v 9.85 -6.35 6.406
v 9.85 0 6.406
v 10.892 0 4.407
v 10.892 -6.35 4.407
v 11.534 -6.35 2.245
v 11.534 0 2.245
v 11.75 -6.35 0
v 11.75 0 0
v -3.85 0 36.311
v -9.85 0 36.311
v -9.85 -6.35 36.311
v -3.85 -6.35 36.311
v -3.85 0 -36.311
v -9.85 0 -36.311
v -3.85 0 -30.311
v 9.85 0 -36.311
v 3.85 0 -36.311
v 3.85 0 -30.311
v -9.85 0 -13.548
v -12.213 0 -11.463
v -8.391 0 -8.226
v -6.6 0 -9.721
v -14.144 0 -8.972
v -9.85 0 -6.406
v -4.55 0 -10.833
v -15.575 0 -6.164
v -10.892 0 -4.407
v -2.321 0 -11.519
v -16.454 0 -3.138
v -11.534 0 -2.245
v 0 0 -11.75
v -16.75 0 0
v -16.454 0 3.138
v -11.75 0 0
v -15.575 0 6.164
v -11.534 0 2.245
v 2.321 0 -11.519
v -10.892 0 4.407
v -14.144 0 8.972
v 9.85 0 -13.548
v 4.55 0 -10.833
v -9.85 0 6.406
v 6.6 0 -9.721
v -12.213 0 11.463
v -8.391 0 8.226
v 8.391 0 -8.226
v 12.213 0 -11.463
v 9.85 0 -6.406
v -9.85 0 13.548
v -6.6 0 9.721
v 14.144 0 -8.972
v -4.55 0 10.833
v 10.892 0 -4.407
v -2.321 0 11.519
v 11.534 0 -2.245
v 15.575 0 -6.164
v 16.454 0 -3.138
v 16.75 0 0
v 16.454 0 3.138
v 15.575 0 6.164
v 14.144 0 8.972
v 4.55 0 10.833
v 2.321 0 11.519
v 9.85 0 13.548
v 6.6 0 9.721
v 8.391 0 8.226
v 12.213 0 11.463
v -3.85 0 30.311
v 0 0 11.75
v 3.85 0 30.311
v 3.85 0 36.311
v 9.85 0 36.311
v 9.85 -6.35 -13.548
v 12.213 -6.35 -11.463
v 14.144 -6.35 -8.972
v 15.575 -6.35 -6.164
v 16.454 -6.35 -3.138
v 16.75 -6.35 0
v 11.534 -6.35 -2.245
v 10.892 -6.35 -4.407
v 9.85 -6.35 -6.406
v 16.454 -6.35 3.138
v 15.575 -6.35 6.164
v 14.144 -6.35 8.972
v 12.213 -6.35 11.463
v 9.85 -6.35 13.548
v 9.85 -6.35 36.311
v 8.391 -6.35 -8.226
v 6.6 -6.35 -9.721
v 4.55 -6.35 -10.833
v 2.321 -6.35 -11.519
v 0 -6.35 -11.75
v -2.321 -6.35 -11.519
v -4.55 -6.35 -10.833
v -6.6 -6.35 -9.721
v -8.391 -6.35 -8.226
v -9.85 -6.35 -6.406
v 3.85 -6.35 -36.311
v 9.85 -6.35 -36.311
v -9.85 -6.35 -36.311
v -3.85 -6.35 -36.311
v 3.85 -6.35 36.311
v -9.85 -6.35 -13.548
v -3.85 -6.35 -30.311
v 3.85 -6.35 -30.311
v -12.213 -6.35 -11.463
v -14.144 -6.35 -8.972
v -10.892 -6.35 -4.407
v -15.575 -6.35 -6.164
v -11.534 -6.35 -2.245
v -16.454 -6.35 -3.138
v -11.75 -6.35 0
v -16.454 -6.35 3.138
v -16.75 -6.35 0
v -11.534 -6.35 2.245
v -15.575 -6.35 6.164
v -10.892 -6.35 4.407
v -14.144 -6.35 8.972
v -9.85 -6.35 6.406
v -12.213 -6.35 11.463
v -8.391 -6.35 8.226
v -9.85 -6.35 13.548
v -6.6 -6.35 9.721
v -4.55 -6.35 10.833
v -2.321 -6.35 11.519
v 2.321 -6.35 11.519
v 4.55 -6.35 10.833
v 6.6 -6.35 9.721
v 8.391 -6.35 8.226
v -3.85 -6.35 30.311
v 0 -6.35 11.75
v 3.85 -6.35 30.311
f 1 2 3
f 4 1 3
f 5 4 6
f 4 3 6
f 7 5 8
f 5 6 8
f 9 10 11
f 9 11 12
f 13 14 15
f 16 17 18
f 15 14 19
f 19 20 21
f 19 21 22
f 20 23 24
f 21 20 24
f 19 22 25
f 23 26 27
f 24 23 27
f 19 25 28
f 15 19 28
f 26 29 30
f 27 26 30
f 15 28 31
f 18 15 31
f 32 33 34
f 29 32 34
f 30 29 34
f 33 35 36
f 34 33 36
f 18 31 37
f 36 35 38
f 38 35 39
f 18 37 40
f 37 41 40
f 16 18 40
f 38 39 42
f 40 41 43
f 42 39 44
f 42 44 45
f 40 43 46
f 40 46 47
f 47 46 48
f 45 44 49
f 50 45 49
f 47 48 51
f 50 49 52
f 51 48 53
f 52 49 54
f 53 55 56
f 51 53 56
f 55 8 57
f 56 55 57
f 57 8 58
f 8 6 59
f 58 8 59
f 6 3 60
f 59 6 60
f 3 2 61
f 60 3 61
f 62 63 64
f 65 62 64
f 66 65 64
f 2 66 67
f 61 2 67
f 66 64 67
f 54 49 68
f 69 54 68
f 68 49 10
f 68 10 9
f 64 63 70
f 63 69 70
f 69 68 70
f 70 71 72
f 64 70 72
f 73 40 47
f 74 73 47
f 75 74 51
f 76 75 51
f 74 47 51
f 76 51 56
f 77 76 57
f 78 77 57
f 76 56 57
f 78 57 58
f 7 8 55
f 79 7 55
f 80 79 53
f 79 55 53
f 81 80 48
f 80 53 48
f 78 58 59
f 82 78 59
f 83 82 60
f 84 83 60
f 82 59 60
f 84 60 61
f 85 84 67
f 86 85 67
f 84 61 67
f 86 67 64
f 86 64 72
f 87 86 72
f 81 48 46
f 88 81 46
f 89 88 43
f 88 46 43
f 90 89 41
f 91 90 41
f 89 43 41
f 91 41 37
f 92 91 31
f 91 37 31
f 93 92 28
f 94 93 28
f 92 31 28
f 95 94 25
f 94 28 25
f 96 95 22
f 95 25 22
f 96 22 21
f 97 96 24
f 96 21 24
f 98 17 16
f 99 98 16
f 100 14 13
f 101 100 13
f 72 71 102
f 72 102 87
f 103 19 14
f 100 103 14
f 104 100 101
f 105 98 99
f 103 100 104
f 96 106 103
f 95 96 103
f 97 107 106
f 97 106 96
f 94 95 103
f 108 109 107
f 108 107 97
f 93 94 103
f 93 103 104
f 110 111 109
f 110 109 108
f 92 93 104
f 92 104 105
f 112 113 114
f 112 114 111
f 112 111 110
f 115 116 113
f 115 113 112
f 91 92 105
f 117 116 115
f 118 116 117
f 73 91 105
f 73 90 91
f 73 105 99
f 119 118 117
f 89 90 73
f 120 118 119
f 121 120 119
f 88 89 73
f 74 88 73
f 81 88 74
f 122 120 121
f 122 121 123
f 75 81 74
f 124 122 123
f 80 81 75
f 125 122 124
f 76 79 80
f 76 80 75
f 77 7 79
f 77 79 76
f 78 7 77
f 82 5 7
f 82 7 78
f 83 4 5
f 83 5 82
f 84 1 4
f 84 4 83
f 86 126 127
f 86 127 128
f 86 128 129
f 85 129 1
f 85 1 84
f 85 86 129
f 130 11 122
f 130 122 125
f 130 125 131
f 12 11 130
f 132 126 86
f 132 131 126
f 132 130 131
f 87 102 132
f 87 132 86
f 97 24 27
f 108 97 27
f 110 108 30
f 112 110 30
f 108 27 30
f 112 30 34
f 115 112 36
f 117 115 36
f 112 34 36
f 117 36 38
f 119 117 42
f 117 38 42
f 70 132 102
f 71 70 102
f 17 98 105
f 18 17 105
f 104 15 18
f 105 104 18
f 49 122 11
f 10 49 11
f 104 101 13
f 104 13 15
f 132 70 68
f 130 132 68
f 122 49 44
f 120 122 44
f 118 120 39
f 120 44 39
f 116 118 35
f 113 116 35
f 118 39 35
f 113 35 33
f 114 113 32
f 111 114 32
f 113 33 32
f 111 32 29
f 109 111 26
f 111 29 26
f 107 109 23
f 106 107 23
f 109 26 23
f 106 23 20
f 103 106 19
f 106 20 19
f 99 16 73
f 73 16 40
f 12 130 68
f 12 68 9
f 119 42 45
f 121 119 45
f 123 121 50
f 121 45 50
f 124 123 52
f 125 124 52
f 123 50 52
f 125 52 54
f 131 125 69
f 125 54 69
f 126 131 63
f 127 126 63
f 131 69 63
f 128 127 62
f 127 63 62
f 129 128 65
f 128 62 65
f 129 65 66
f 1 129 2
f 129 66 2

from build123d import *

# Parameters (mm, degrees)
F1_DEPTH = 6.35
F2_W     = 6
F2_H     = 6
F3_DEPTH = 6.35


# Not quite as in the source:
# - a length typed as a fraction of an inch, garbled in the dataset ("3 / 203.2 mm" for 3/8 in), is restored


with BuildPart() as f1:
    # F0 (on Front) → F1 (new body)
    with BuildSketch(Plane.XZ):
        with BuildLine():
            ThreePointArc((9.85, 6.4062469512), (11.2649900133, 3.3410327745), (11.75, 0))
            ThreePointArc((11.75, 0), (11.2649900133, -3.3410327745), (9.85, -6.4062469512))
            Line((9.85, -6.4062469512), (9.85, -13.5476935306))
            ThreePointArc((9.85, -13.5476935306), (14.9256490646, -7.6018089952), (16.75, 0))
            ThreePointArc((16.75, 0), (14.9256490646, 7.6018089952), (9.85, 13.5476935306))
            Line((9.85, 13.5476935306), (9.85, 6.4062469512))
        make_face()
        with BuildLine():
            ThreePointArc((-9.85, 6.4062469512), (0, 11.75), (9.85, 6.4062469512))
            Line((9.85, 6.4062469512), (9.85, 13.5476935306))
            ThreePointArc((9.85, 13.5476935306), (0, 16.75), (-9.85, 13.5476935306))
            Line((-9.85, 13.5476935306), (-9.85, 6.4062469512))
        make_face()
        with BuildLine():
            Line((9.85, -13.5476935306), (9.85, -6.4062469512))
            ThreePointArc((9.85, -6.4062469512), (0, -11.75), (-9.85, -6.4062469512))
            Line((-9.85, -6.4062469512), (-9.85, -13.5476935306))
            ThreePointArc((-9.85, -13.5476935306), (0, -16.75), (9.85, -13.5476935306))
        make_face()
        with BuildLine():
            ThreePointArc((-9.85, -6.4062469512), (-11.75, 0), (-9.85, 6.4062469512))
            Line((-9.85, 6.4062469512), (-9.85, 13.5476935306))
            ThreePointArc((-9.85, 13.5476935306), (-16.75, 0), (-9.85, -13.5476935306))
            Line((-9.85, -13.5476935306), (-9.85, -6.4062469512))
        make_face()
        with BuildLine():
            ThreePointArc((-9.85, 13.5476935306), (0, 16.75), (9.85, 13.5476935306))
            Line((9.85, 13.5476935306), (9.85, 30.31089))
            Line((9.85, 30.31089), (-9.85, 30.31089))
            Line((-9.85, 30.31089), (-9.85, 13.5476935306))
        make_face()
        with BuildLine():
            Line((9.85, -30.31089), (9.85, -13.5476935306))
            ThreePointArc((9.85, -13.5476935306), (0, -16.75), (-9.85, -13.5476935306))
            Line((-9.85, -13.5476935306), (-9.85, -30.31089))
            Line((-9.85, -30.31089), (9.85, -30.31089))
        make_face()
    extrude(amount=F1_DEPTH)

    # F2 (on face) → F3 (join)
    with BuildSketch(Plane.XZ.offset(6.35)):
        with Locations((-6.85, 33.31089)):
            Rectangle(F2_W, F2_H)
        with Locations((6.85, 33.31089)):
            Rectangle(F2_W, F2_H)
        with Locations((-6.85, -33.31089)):
            Rectangle(F2_W, F2_H)
        with Locations((6.85, -33.31089)):
            Rectangle(F2_W, F2_H)
    extrude(amount=-F3_DEPTH)


solid = f1.part
